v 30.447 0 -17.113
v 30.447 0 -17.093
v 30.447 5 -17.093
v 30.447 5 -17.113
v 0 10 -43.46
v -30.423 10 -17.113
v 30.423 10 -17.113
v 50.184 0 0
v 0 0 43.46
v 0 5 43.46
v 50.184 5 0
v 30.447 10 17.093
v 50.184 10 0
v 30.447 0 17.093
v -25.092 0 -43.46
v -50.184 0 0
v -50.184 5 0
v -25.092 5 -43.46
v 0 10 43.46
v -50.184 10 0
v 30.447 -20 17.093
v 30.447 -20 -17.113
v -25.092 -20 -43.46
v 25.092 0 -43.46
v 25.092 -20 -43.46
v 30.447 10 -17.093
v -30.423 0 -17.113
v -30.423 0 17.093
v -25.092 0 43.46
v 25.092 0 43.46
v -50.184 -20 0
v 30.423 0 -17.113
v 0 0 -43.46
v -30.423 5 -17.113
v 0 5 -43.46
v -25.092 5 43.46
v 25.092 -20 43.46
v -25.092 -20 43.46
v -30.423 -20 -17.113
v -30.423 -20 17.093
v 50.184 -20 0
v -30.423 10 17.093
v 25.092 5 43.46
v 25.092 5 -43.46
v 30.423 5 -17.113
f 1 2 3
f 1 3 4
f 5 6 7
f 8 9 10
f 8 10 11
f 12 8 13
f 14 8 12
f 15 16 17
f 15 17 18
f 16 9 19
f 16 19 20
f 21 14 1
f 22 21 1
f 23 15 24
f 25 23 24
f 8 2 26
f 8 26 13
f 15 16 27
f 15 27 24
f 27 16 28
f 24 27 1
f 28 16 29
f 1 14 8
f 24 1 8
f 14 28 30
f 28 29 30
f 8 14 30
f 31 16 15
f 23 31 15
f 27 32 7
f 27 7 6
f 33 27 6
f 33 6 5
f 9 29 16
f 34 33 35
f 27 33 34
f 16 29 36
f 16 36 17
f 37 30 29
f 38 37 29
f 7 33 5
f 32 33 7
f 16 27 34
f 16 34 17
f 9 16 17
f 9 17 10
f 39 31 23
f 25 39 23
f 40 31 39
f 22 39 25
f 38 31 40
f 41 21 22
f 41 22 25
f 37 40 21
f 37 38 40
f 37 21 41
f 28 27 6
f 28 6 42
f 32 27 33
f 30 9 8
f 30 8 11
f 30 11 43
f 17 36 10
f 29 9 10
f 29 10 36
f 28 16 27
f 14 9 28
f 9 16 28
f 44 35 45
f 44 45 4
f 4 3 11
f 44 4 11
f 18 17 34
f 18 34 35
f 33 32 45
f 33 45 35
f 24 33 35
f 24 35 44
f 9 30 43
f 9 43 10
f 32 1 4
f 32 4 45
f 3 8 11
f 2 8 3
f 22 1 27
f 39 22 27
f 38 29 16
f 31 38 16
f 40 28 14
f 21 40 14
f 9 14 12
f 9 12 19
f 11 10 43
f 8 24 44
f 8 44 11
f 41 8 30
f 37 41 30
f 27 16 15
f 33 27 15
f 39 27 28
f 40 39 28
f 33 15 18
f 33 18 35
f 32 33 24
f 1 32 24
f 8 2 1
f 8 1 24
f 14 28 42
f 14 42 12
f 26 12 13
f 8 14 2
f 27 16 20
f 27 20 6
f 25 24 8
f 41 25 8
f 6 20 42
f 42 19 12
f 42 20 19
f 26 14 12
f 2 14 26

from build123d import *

# Parameters (mm, degrees)
F1_DEPTH = 20
F2_DEPTH = 10
F3_DEPTH = 5


with BuildPart() as f1:
    # F0 (on Front) → F1 (new body)
    with BuildSketch(Plane.XZ):
        Polygon((30.4469198259, 17.0925220957), (0, 43.4603281319), (-50.1836642921, 0), (-30.4234071336, -17.1128846846), (-30.4234071336, 17.0925220957), align=None)
        Polygon((0, 43.4603281319), (-25.091832146, 43.4603281319), (-50.1836642921, 0), align=None)
        Polygon((25.091832146, 43.4603281319), (0, 43.4603281319), (30.4469198259, 17.0925220957), (50.1836642921, 0), align=None)
        Polygon((50.1836642921, 0), (30.4469198259, 17.0925220957), (30.4469198259, -17.0925220957), align=None)
        Polygon((25.091832146, -43.4603281319), (50.1836642921, 0), (30.4469198259, -17.0925220957), (30.4469198259, -17.1128846846), (30.4234071336, -17.1128846846), (0, -43.4603281319), align=None)
        Polygon((-30.4234071336, -17.1128846846), (-50.1836642921, 0), (-25.091832146, -43.4603281319), (0, -43.4603281319), align=None)
        Polygon((30.4234071336, -17.1128846846), (-30.4234071336, -17.1128846846), (0, -43.4603281319), align=None)
    extrude(amount=F1_DEPTH)


with BuildPart() as f2:
    # F0 (on Front) → F2 (new body)
    with BuildSketch(Plane.XZ):
        Polygon((30.4234071336, -17.1128846846), (-30.4234071336, -17.1128846846), (0, -43.4603281319), align=None)
    extrude(amount=-F2_DEPTH)


with BuildPart() as f2b:
    # F0 (on Front) → F2, piece 2 (new body)
    with BuildSketch(Plane.XZ):
        Polygon((50.1836642921, 0), (30.4469198259, 17.0925220957), (30.4469198259, -17.0925220957), align=None)
    extrude(amount=-F2_DEPTH)


with BuildPart() as f2c:
    # F0 (on Front) → F2, piece 3 (new body)
    with BuildSketch(Plane.XZ):
        Polygon((30.4469198259, 17.0925220957), (0, 43.4603281319), (-50.1836642921, 0), (-30.4234071336, -17.1128846846), (-30.4234071336, 17.0925220957), align=None)
    extrude(amount=-F2_DEPTH)


with BuildPart() as f3:
    # F0 (on Front) → F3 (new body)
    with BuildSketch(Plane.XZ):
        Polygon((0, 43.4603281319), (-25.091832146, 43.4603281319), (-50.1836642921, 0), align=None)
    extrude(amount=-F3_DEPTH)


with BuildPart() as f3b:
    # F0 (on Front) → F3, piece 2 (new body)
    with BuildSketch(Plane.XZ):
        Polygon((25.091832146, 43.4603281319), (0, 43.4603281319), (30.4469198259, 17.0925220957), (50.1836642921, 0), align=None)
    extrude(amount=-F3_DEPTH)


with BuildPart() as f3c:
    # F0 (on Front) → F3, piece 3 (new body)
    with BuildSketch(Plane.XZ):
        Polygon((-30.4234071336, -17.1128846846), (-50.1836642921, 0), (-25.091832146, -43.4603281319), (0, -43.4603281319), align=None)
    extrude(amount=-F3_DEPTH)


with BuildPart() as f3d:
    # F0 (on Front) → F3, piece 4 (new body)
    with BuildSketch(Plane.XZ):
        Polygon((25.091832146, -43.4603281319), (50.1836642921, 0), (30.4469198259, -17.0925220957), (30.4469198259, -17.1128846846), (30.4234071336, -17.1128846846), (0, -43.4603281319), align=None)
    extrude(amount=-F3_DEPTH)


solid = Compound([f1.part, f2.part, f2b.part, f2c.part, f3.part, f3b.part, f3c.part, f3d.part])
